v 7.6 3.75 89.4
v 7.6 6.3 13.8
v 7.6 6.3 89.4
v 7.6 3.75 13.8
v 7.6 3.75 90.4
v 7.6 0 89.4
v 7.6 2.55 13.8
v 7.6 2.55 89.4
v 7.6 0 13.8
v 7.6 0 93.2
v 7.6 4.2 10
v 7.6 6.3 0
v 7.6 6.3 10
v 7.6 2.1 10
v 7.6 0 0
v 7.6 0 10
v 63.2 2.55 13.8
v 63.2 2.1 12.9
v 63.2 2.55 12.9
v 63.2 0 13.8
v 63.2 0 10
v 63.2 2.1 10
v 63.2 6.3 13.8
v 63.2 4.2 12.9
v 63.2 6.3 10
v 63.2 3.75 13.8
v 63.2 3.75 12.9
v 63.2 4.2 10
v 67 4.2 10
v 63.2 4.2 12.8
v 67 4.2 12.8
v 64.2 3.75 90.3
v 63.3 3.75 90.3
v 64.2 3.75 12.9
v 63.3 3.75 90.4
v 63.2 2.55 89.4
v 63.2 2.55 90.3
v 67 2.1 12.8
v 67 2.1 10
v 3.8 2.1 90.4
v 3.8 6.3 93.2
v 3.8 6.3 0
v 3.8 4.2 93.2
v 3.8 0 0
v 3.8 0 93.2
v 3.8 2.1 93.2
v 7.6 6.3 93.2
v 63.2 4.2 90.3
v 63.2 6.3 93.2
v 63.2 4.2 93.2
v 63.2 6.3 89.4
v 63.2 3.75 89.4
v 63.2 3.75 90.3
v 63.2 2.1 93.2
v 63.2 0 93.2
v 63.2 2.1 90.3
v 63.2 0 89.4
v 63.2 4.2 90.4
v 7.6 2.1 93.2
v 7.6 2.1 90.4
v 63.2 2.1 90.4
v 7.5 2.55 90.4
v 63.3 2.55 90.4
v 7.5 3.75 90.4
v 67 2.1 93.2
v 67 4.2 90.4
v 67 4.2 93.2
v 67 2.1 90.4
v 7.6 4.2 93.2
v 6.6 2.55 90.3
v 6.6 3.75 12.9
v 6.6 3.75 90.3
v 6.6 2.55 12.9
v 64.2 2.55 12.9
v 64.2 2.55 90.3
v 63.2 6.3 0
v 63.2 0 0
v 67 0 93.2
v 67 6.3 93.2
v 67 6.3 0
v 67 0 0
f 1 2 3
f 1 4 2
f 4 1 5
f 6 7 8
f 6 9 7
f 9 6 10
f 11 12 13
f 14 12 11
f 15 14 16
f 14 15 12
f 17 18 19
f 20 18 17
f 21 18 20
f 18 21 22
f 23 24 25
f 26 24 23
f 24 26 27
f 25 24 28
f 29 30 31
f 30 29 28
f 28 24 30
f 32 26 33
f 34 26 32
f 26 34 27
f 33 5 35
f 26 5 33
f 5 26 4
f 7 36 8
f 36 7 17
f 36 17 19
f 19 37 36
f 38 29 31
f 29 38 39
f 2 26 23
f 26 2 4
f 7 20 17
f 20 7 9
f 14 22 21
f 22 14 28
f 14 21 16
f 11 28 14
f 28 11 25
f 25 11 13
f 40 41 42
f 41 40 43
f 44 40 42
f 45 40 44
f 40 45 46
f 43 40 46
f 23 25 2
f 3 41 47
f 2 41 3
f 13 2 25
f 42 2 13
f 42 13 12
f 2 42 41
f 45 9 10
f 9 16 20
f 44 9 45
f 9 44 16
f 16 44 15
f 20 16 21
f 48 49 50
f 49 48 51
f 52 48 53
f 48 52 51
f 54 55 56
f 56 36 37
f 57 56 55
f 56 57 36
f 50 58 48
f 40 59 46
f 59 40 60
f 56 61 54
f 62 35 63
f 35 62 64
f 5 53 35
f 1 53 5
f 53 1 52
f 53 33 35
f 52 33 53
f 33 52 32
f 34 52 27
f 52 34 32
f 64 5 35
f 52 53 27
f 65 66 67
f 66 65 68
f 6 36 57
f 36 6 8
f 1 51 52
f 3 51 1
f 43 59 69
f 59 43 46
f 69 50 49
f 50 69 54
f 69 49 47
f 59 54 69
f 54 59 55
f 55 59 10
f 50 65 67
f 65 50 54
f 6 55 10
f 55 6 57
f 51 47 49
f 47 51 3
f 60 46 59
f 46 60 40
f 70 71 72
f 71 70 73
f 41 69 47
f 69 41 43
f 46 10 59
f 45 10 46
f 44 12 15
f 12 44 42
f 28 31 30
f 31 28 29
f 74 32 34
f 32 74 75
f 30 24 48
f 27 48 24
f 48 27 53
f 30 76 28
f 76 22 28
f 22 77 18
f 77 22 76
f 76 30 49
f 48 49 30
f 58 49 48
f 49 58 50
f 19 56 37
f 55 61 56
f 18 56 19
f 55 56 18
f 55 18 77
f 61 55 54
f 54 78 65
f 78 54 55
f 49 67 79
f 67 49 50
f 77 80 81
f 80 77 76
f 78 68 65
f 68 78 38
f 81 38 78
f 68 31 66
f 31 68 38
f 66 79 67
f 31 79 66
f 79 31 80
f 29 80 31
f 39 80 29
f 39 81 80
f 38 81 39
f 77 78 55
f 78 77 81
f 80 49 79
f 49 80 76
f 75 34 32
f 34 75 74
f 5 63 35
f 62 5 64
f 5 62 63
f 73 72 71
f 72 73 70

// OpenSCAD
// file: worktop/panel.scad
include<config.scad>

module panel(height, width, thickness) {
    if (verbose) {
        echo("panel made to fit inside trestle.");
    }

    echo("CUT LIST: Panel, one layer of 12mm ply,", width=width, length=height);

    if ((width > height && (width > 80 || height > 60)) || (width < height && (width > 60 || height > 80))) {
        echo("DIMENSION WARNING: not easy to cut panels out of ply sheets.");
    }

    color("#F7F1DE")
    cube([width, thickness, height], center = false);
}
// file: worktop/leg.scad
include<config.scad>
include<lumber_dimensions.scad>

module leg(length, btrestle_z_off, tenon_thickness, groove_depth) {
    // This is half an apron thickness.
    lumber_x = two_by;
    lumber_y = four_by;
    lumber_z = length;

    tenon_height = two_by - groove_depth;
    tenon_cheek_depth = (lumber_y - tenon_thickness) / 2;
    groove_thickness = ply_thickness_panel;
    groove_offset = (lumber_y - groove_thickness) / 2;

    mor_x_off = -delta;
    mor_y_off = tenon_cheek_depth;
    bmor_z_off = btrestle_z_off;
    tmor_z_off = lumber_z - tenon_height;

    mor_x = lumber_x + 2*delta;
    mor_y = tenon_thickness;
    bmor_z = tenon_height;
    tmor_z = tenon_height + delta; // protrudes from top

    groo_x_off = lumber_x - groove_depth;
    groo_y_off = groove_offset;
    groo_z_off = btrestle_z_off + tenon_height - delta;

    groo_x = groove_depth + delta;
    groo_y = groove_thickness;
    groo_z = lumber_z - groo_z_off;

    echo ("CUT LIST: Leg. 4x4 stock (assumed 89mm^2)", length=length);

    if (verbose) {
        echo("All mortice widths are 1/3 the stock, set centrally.")
        echo("MORTICE 1: for bottom trestle, through tenon.", position_z=btrmor_z_off, length_z=btrmor_z_size);
        echo("MORTICE 2: for top trestle, through tenon, same orientation as MORTICE 1.", position_z_from_top=ttrestle_z_drop, length_z=ttrmor_z_size);
    }
    color("#4E220F")
    difference() {
        cube([lumber_x, lumber_y, lumber_z], center = false);
        union() {// cuts to make for mortices.
            // lower trestle:
            translate([mor_x_off,mor_y_off,bmor_z_off]) {
                cube([mor_x, mor_y, bmor_z], center=false);
            };
            // upper trestle:
            translate([mor_x_off,mor_y_off,tmor_z_off]) {
                cube([mor_x, mor_y, tmor_z], center=false);
            };
            // groove:
            translate([groo_x_off,groo_y_off,groo_z_off]) {
                cube([groo_x, groo_y, groo_z], center=false);
            };
        }
    }
}
// file: worktop/stretcher.scad
include<config.scad>
include<lumber_dimensions.scad>

module stretcher(length, tenon_length, tenon_thickness, groove_depth, panel_thickness) {
    if (verbose) {
        echo("Stretchers have a tenon at each end.");
        echo("They also have (as do all parts) a dado for the ply panel.");
        echo("the tenon is flush with the edges of the mortice on the leg.");
    }

    should_crop_tenon = true;

    // These stretchers are sideways on compared to the worktop, and run along the X axis (plane Y=0 is the wall.)
    lumber_height = two_by;
    lumber_thickness = four_by;

    // Cheeks:
    tenon_cheek_depth = (lumber_thickness-tenon_thickness)/2;

    fcheek_x_off = -delta;
    bcheek_x_off = length - tenon_length;

    lcheek_y_off = -delta;
    rcheek_y_off = lumber_thickness - tenon_cheek_depth;
    
    // Same for all cheeks:
    cheek_zoff = -delta;
    cheek_depth = tenon_cheek_depth + delta;
    cheek_length = tenon_length + delta;
    cheek_height = lumber_height+(2*delta);

    // dado for ply panel.
    groove_z_off = lumber_height - groove_depth;
    groove_z = groove_depth + delta;
    groove_y_off = (lumber_thickness - panel_thickness)/2;
    groove_x_off = tenon_length + (should_crop_tenon ? -delta : 0);
    groove_x = length - 2 * tenon_length + (should_crop_tenon ? 2*delta : 0);

    btecrop_x_off = -delta;
    ftecrop_x_off = length - tenon_length;
    tecrop_y_off = tenon_cheek_depth - delta;
    tecrop_z_off = (lumber_height - groove_depth) + delta;

    tecrop_x = tenon_length + delta;
    tecrop_y = tenon_thickness + 2*delta;
    tecrop_z = lumber_height - groove_depth;


    echo("CUT LIST: bottom trestle, CLS stock (assumed 63/38mm)", length = length);

    if (verbose) {
        echo("at each end:");
        echo(" TENON: cut first, on each end, full width",length = tenon_length, depth = tenon_cheek_depth, final_thickness=tenon_thickness);
    }

    color("#9D6638")
    difference() {
        union() {
            cube([length, lumber_thickness, lumber_height], center = false);

        }
        union() { // cuts out of board
            // four tenon cheeks
            translate([fcheek_x_off,lcheek_y_off,cheek_zoff]) {
                cube([cheek_length,cheek_depth,cheek_height], center=false);
            };
            translate([bcheek_x_off,lcheek_y_off,cheek_zoff]) {
                cube([cheek_length,cheek_depth,cheek_height], center=false);
            };
            translate([fcheek_x_off,rcheek_y_off,cheek_zoff]) {
                cube([cheek_length,cheek_depth,cheek_height], center=false);
            };
            translate([bcheek_x_off,rcheek_y_off,cheek_zoff]) {
                cube([cheek_length,cheek_depth,cheek_height], center=false);
            };
            // groove for panel:
            translate([groove_x_off, groove_y_off, groove_z_off]) {
                cube([groove_x,panel_thickness,groove_z], center=false);
            };
            // crop tenons to groove height, if requested.
            if (should_crop_tenon) {
                translate([btecrop_x_off, tecrop_y_off, tecrop_z_off]) {
                    cube([tecrop_x,tecrop_y,tecrop_z], center=false);
                };
                translate([ftecrop_x_off, tecrop_y_off, tecrop_z_off]) {
                    cube([tecrop_x,tecrop_y,tecrop_z], center=false);
                };
            }
        }
    }
}
// file: worktop/lumber_dimensions.scad
// for differences:
delta = 0.1;

// lumber dimensions
ply_thickness_top = 1.8;
ply_thickness_panel = 1.2;
// CLS studs (2x3, really)
two_by = 3.8;
four_by = 6.3;
// file: worktop/config.scad
verbose = false;
mode = "comp";
which_component = "trestle";
// main file
// ALL UNITS IN centimetres.
include<worktop/config.scad>
include<worktop/lumber_dimensions.scad>

include<worktop/stretcher.scad>
include<worktop/leg.scad>
include<worktop/panel.scad>


wt_height = 95;
wt_depth = 70;
wt_width = 300;

leg_v2_x = two_by;
leg_x = two_by;

tenon_thickness = four_by / 3;

groove_depth = 1;

bstretcher_z_off = 10;

trestle_setback = 3;

module solo_stretcher() {
    stretcher_length = wt_depth - leg_v2_x - trestle_setback;
    stretcher_tenon_length = leg_x;
    
    stretcher(stretcher_length, stretcher_tenon_length, tenon_thickness, groove_depth, ply_thickness_panel);
}

module solo_trestle_leg() {
    length = wt_height - ply_thickness_top;

    leg(length, bstretcher_z_off, tenon_thickness, groove_depth);
}

module solo_panel() {
    frame_thickness = two_by - groove_depth;
    height = wt_height - ply_thickness_top - 2*frame_thickness - bstretcher_z_off;
    width = wt_depth - leg_v2_x - 2*frame_thickness - trestle_setback;

    panel(height, width, ply_thickness_panel);
}

module completed_trestle() {

    // Two stretchers, two legs and a panel.
    stretcher_length = wt_depth - leg_v2_x - trestle_setback;
    stretcher_tenon_length = leg_x;

    tstretcher_z_off = wt_height - ply_thickness_top - two_by;
    y_off = 0;
    stretcher_x_off = leg_v2_x;

    translate([stretcher_x_off,y_off,bstretcher_z_off]) {
        stretcher(stretcher_length, stretcher_tenon_length, tenon_thickness, groove_depth, ply_thickness_panel);
    }
    //rotate and compensate with the translate.
    translate([stretcher_x_off,y_off+four_by,tstretcher_z_off+two_by]) {
        rotate(a = [180, 0, 0]) {
            stretcher(stretcher_length, stretcher_tenon_length, tenon_thickness, groove_depth, ply_thickness_panel);
        }
    }

    leg_length = wt_height - ply_thickness_top;
    leg_z_off = 0;
    bleg_x_off = leg_v2_x;
    fleg_x_off = wt_depth - trestle_setback - leg_x;

    translate([bleg_x_off,y_off,leg_z_off]) {
        leg(leg_length, bstretcher_z_off, tenon_thickness, groove_depth);
    }

    translate([fleg_x_off + leg_x,y_off+four_by,leg_z_off]) {
        rotate(a = [0, 0, 180]) {
            leg(leg_length, bstretcher_z_off, tenon_thickness, groove_depth);
        }
    }

    frame_thickness = two_by - groove_depth;
    panel_height = wt_height - ply_thickness_top - 2*frame_thickness - bstretcher_z_off;
    panel_width = wt_depth - leg_v2_x - 2*frame_thickness - trestle_setback;

    panel_x_off = leg_v2_x + leg_x - groove_depth;
    panel_y_off = (four_by - ply_thickness_panel) / 2;
    panel_z_off = bstretcher_z_off + two_by - groove_depth;
    translate([panel_x_off,panel_y_off,panel_z_off]) {
        panel(panel_height, panel_width, ply_thickness_panel);
    }
}

module whole_room() {
    // TODO
}

module component(which) {
    verbose = true; // does this work? no!
    if (which == "trestle_leg") {
        echo("LEG, build ??.");
        solo_trestle_leg();
    }
    else if (which == "stretcher") {
        echo("stretcher, build ??.");
        solo_stretcher();
    }
    else if (which == "panel") {
        echo("panel, build ??");
        solo_panel();
    }
    else if (which == "trestle") {
        echo("trestle, build ??");
        completed_trestle();
    }
    else if (which == "extra_leg") {
        echo("LEG, build ??.");
        solo_extra_leg();
    }
    else if (which == "top") {
        echo("TOP, one layer of 18mm ply.");
        //top(tt_width, tt_depth, tt_thickness);
    }
}


module cli() {
    if (mode == "project") {
        whole_room();
    }
    else {
        component(which_component);
    }
}

cli();
